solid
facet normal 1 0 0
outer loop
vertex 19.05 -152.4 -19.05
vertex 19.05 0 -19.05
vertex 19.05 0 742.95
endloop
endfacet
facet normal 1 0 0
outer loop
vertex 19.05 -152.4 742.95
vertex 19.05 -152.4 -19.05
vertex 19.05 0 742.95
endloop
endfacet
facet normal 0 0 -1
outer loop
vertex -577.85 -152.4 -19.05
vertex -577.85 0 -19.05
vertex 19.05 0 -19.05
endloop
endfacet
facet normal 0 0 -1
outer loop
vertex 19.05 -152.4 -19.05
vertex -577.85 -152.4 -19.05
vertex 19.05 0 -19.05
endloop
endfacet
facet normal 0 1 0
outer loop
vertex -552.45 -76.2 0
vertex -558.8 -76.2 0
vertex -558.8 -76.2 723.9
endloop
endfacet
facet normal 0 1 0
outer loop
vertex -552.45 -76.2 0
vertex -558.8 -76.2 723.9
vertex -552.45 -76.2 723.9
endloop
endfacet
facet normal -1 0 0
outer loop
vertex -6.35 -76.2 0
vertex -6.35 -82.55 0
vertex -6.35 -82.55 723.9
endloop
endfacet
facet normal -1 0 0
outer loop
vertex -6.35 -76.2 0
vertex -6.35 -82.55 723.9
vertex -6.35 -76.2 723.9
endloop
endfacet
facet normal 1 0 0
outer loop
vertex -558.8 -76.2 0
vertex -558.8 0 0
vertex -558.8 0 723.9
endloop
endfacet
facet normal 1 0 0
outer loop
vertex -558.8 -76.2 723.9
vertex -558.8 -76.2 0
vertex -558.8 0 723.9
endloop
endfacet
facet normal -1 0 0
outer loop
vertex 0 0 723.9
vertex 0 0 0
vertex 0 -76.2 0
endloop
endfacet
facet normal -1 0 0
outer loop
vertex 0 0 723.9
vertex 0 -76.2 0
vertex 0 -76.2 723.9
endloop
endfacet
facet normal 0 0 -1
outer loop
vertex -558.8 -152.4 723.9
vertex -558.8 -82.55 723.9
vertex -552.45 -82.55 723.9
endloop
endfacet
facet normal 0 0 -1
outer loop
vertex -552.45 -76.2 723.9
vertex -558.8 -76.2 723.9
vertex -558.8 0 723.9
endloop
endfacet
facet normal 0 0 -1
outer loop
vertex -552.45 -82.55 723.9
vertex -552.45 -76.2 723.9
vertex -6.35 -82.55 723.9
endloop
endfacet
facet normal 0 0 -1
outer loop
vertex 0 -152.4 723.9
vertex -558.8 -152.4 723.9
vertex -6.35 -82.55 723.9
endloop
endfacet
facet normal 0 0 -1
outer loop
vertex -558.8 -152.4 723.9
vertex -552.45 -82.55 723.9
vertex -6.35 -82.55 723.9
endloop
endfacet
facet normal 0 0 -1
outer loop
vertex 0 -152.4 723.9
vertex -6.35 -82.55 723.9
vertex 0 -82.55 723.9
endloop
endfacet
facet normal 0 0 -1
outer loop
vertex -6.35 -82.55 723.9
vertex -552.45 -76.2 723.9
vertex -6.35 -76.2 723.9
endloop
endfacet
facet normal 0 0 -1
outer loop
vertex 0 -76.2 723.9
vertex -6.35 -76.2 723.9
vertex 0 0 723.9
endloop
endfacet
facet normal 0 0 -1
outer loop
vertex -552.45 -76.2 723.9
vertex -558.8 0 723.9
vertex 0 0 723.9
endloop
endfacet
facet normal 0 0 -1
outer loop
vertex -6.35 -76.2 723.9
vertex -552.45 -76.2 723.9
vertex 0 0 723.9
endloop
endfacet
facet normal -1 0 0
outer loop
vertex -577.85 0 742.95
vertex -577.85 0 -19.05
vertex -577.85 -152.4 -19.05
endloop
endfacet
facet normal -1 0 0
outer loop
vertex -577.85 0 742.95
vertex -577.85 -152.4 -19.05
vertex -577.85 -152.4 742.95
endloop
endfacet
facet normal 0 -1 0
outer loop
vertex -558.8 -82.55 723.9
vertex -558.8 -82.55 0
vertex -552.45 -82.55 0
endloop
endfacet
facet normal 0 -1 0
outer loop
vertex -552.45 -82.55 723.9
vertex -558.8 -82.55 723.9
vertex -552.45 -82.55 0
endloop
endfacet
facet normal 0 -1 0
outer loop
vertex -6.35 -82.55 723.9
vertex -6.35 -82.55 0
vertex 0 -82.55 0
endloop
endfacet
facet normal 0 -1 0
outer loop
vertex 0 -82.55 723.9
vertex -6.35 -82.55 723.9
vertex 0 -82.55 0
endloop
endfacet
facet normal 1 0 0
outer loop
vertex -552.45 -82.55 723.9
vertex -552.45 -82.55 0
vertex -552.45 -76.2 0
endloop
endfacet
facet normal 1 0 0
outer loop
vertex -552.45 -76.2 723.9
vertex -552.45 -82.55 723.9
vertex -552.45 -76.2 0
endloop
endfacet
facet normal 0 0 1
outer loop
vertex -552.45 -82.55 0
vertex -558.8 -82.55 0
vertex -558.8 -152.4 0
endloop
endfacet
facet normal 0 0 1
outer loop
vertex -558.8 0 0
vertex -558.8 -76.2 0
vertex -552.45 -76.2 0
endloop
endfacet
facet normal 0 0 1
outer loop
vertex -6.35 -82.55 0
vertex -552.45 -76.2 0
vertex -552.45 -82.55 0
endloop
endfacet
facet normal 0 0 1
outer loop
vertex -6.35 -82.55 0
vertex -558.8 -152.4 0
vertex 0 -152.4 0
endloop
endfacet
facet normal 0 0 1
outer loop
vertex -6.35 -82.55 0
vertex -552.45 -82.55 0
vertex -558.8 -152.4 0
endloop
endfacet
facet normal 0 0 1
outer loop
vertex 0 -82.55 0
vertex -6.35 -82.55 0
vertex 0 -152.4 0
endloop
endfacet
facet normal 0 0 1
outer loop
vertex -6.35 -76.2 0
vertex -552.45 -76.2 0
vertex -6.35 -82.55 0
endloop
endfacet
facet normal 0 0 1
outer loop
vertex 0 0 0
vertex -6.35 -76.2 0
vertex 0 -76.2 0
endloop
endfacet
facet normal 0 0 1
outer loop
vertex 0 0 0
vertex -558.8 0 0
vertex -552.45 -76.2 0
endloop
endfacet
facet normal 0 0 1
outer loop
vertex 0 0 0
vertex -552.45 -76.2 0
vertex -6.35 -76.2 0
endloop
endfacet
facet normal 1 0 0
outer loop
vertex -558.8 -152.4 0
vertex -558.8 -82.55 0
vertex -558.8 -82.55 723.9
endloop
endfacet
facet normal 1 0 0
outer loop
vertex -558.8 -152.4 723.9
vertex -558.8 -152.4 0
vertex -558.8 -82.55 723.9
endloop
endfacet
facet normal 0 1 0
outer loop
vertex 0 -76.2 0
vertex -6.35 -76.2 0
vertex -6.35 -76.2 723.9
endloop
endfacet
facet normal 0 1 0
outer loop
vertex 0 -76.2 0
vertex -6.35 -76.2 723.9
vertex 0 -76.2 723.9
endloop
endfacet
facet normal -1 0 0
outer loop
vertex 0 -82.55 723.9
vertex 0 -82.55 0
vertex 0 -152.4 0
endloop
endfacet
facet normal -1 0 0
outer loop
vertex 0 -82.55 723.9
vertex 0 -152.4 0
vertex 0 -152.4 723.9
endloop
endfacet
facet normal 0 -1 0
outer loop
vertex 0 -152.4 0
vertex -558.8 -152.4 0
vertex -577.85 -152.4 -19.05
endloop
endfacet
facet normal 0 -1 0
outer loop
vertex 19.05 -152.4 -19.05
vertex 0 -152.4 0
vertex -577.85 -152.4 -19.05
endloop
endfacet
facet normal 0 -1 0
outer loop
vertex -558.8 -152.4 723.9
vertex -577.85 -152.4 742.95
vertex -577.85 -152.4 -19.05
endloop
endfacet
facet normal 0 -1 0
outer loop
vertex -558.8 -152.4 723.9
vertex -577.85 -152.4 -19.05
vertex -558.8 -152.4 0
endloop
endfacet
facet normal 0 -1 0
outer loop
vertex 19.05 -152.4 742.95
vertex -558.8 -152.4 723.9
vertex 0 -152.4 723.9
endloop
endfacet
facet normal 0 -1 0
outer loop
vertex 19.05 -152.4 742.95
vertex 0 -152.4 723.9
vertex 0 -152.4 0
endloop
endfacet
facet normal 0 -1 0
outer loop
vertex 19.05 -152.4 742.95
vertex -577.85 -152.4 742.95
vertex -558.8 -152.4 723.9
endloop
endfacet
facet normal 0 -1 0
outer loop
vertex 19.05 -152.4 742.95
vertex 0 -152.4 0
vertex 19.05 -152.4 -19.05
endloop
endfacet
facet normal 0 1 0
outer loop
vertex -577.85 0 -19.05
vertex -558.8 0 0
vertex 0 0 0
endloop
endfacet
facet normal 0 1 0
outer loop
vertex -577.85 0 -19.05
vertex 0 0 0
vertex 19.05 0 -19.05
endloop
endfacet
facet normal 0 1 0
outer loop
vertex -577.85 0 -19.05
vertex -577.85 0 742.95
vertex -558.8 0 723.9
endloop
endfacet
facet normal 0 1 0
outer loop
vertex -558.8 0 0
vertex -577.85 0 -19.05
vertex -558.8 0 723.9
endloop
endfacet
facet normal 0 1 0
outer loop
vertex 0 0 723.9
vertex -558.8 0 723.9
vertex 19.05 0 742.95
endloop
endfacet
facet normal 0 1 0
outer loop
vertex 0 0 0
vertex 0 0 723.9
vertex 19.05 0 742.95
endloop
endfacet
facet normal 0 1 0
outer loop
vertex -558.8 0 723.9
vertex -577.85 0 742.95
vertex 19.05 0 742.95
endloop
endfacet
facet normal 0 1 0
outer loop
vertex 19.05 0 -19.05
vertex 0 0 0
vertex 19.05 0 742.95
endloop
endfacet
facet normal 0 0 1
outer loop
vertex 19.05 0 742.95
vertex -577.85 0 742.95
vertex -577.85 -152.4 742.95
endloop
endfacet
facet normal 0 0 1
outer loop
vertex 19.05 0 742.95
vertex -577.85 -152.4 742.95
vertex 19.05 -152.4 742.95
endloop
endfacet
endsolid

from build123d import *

# Parameters (mm, degrees)
F0_W     = 596.9
F0_H     = 762
F0_W_2   = 558.8
F0_H_2   = 723.9
F1_DEPTH = 152.4
F2_W     = 6.35
F2_H     = 6.35
F3_DEPTH = 723.9


with BuildPart() as f1:
    # F0 (on Front) → F1 (new body)
    with BuildSketch(Plane.XZ):
        with Locations((-279.4, 361.95)):
            Rectangle(F0_W, F0_H)
        with Locations((-279.4, 361.95)):
            Rectangle(F0_W_2, F0_H_2, mode=Mode.SUBTRACT)
    extrude(amount=F1_DEPTH)

    # F2 (on face) → F3 (join, through all)
    with BuildSketch(Plane.XY):
        with Locations((-555.625, -79.375)):
            Rectangle(F2_W, F2_H)
        with Locations((-3.175, -79.375)):
            Rectangle(F2_W, F2_H)
    extrude(amount=F3_DEPTH)


solid = f1.part
